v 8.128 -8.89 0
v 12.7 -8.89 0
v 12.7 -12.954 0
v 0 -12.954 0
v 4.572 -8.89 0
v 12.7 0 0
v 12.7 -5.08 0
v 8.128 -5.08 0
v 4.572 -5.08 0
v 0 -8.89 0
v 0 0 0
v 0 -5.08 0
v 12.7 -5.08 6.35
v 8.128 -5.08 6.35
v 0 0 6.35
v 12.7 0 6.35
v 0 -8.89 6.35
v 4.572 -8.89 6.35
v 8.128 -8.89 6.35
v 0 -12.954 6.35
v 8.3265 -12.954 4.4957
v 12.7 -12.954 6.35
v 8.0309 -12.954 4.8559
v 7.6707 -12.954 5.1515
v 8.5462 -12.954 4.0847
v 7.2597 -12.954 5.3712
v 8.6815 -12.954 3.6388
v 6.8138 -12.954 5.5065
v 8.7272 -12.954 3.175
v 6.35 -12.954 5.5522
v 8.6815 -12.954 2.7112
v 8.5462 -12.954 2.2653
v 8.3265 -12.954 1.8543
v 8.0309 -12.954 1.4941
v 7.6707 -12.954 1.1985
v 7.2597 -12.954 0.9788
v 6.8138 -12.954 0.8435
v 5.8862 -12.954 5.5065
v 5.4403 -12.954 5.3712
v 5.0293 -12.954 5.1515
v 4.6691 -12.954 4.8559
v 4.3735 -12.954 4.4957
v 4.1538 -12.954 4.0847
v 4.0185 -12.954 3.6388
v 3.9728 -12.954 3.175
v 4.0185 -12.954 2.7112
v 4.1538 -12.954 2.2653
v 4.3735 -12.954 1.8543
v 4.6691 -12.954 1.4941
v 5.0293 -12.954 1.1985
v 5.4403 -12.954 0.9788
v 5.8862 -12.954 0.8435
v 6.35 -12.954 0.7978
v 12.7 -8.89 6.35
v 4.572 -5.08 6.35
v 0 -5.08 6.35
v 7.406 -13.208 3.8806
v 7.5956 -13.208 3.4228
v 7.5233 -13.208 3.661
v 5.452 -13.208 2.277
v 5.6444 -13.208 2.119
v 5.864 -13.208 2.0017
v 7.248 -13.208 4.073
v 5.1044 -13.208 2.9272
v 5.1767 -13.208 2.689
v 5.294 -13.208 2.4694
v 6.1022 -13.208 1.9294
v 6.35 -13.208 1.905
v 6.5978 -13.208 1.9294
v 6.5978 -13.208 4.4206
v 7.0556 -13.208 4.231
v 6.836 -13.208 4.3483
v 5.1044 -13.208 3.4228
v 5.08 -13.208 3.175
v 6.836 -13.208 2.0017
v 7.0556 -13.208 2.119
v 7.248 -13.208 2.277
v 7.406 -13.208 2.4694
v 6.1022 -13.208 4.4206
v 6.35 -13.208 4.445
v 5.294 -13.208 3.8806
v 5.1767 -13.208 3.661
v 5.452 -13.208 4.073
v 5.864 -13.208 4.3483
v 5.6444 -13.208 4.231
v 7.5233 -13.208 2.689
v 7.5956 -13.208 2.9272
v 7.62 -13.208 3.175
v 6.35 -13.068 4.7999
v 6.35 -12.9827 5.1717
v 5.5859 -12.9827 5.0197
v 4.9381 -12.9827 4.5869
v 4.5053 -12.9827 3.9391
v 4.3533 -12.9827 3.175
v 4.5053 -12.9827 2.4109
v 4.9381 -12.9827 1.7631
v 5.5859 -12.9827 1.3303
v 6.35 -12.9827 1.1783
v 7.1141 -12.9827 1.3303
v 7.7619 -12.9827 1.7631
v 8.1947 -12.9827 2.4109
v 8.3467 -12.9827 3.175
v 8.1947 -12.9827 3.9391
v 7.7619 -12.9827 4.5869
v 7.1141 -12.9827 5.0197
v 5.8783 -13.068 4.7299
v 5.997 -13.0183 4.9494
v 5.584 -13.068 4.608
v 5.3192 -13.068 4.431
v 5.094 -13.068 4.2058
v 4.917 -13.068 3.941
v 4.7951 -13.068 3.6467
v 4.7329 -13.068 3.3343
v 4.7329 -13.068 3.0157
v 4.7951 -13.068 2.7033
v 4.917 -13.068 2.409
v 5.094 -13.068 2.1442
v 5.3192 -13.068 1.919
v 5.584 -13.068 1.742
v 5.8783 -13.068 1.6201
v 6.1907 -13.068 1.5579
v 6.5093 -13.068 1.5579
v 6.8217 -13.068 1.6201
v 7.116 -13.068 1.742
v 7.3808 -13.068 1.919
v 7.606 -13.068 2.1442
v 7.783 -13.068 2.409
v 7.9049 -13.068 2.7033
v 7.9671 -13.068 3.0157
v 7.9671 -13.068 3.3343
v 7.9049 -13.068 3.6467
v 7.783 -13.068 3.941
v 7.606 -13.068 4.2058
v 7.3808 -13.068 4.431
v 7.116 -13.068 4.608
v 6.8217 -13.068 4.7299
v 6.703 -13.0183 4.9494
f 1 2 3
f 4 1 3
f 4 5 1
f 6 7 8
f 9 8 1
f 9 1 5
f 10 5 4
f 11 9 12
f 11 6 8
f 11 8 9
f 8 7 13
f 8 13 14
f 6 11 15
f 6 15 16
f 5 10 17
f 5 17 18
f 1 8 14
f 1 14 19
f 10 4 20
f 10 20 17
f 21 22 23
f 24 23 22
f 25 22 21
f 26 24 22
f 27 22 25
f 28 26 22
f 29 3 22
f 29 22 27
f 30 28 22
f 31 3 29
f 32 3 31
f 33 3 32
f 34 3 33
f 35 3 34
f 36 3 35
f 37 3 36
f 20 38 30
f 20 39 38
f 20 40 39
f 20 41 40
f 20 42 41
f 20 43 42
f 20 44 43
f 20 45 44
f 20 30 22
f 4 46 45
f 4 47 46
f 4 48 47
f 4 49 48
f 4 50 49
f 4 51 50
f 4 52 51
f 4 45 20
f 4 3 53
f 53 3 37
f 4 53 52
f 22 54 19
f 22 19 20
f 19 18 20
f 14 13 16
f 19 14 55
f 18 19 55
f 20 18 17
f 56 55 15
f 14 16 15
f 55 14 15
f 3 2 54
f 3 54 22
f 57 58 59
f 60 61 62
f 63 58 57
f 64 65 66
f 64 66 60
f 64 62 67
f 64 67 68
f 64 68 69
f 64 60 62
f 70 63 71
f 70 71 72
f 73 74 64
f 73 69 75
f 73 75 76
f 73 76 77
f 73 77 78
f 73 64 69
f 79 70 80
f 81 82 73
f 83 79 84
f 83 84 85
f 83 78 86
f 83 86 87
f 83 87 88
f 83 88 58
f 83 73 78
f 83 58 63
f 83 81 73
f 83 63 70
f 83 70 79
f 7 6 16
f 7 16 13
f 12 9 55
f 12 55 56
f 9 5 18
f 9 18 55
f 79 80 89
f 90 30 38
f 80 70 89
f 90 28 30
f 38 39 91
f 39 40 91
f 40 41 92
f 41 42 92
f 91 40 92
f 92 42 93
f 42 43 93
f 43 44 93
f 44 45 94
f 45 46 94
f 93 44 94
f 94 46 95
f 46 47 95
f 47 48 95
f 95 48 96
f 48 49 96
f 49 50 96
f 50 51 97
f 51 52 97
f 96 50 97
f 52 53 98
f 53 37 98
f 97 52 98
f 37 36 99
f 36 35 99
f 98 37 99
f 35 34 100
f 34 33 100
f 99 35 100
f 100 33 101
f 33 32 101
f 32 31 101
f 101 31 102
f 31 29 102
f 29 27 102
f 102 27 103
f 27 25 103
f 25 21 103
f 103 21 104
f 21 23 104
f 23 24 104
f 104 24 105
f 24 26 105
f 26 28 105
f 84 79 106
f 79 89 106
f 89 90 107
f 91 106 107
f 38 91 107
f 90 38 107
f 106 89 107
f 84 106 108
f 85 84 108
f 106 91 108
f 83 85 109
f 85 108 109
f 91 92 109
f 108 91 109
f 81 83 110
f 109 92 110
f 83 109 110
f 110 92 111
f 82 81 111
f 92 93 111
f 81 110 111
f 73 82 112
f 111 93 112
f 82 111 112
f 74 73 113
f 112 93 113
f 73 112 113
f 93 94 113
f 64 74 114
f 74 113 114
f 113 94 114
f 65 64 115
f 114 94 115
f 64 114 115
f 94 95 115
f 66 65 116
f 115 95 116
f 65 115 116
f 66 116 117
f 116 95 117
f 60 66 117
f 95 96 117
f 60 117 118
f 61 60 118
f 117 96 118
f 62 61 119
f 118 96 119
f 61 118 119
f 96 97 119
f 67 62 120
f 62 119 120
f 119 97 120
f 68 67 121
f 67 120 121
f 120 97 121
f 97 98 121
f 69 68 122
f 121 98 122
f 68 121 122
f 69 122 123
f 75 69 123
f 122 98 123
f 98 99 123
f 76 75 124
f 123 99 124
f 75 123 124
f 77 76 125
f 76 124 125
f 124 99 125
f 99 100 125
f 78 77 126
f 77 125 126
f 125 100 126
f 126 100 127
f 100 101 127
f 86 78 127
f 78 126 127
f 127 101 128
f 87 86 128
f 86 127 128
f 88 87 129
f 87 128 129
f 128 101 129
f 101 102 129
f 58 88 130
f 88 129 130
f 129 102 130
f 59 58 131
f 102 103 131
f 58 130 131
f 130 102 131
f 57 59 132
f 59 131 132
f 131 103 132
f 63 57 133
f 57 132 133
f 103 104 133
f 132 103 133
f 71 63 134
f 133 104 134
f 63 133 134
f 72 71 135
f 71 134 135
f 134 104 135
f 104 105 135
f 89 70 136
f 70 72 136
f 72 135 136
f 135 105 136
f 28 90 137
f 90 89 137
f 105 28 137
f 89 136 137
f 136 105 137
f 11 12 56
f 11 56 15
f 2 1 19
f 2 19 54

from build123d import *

# Parameters (mm, degrees)
BODY_DEPTH = 6.35
SKETCH4_R  = 1.27
FLAG_DEPTH = 0.254
HOLDER_R   = 2.54


with BuildPart() as part:
    # Sketch2 → body (new body)
    with BuildSketch(Plane.XY):
        Polygon((0, 0), (12.7, 0), (12.7, -5.08), (8.128, -5.08), (8.128, -8.89), (12.7, -8.89), (12.7, -12.954), (0, -12.954), (0, -8.89), (4.572, -8.89), (4.572, -5.08), (0, -5.08), align=None)
    extrude(amount=BODY_DEPTH)

    # Sketch4 → flag (add)
    with BuildSketch(Plane.XZ.offset(12.954)):
        with Locations(Location((6.35, 3.175, 0), (0, 0, 90))):
            Circle(SKETCH4_R)
    extrude(amount=FLAG_DEPTH)

    # holder
    # the kernel refuses this fillet: 2.54 mm, written as the material it adds along each edge
    with BuildSketch(Plane(origin=(6.35, -12.954, 3.175), x_dir=(0, 0, 1), z_dir=(1, 0, 0))) as holder_piece_1:
        with BuildLine():
            CenterArc((2.377160332, 2.54), HOLDER_R, 244.158067237, 25.841932763)
            Line((1.27, 0.254), (1.27, 0))
            Line((1.27, 0), (2.377160332, 0))
        make_face()
    revolve(axis=Axis((6.35, -12.954, 3.175), (0, -1, 0)))


solid = part.part
